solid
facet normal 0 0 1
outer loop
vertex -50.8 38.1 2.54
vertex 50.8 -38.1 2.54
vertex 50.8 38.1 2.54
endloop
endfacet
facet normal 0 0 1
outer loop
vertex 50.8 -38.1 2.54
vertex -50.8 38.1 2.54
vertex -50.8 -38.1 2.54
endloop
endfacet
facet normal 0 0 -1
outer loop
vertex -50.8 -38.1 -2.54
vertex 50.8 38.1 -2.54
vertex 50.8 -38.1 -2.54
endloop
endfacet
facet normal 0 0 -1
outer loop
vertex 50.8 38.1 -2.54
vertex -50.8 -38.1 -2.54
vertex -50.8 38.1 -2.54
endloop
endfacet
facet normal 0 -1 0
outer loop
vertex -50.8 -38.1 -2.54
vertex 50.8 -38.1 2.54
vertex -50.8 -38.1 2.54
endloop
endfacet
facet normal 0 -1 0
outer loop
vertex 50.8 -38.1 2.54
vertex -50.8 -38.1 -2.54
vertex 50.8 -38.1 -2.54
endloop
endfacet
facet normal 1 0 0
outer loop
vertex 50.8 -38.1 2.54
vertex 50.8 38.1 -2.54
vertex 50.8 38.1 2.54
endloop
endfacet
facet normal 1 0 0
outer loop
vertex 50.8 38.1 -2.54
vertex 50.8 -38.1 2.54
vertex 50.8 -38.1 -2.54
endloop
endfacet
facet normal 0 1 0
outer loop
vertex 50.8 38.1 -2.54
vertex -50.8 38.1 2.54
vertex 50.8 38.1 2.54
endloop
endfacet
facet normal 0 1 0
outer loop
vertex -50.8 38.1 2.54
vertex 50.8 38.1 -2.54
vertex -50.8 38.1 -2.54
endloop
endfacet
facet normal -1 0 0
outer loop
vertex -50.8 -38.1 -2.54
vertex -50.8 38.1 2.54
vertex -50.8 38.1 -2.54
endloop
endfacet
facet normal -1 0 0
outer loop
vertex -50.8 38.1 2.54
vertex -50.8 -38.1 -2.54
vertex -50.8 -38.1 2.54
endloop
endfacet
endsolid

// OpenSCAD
// ========================================
// a 4 by 3 by 0.2 inch plate
// NeuroCAD canonical IR; dimensions are millimetres
// ========================================
$fn = 48;

cube(size=[101.6, 76.2, 5.08], center=true);
